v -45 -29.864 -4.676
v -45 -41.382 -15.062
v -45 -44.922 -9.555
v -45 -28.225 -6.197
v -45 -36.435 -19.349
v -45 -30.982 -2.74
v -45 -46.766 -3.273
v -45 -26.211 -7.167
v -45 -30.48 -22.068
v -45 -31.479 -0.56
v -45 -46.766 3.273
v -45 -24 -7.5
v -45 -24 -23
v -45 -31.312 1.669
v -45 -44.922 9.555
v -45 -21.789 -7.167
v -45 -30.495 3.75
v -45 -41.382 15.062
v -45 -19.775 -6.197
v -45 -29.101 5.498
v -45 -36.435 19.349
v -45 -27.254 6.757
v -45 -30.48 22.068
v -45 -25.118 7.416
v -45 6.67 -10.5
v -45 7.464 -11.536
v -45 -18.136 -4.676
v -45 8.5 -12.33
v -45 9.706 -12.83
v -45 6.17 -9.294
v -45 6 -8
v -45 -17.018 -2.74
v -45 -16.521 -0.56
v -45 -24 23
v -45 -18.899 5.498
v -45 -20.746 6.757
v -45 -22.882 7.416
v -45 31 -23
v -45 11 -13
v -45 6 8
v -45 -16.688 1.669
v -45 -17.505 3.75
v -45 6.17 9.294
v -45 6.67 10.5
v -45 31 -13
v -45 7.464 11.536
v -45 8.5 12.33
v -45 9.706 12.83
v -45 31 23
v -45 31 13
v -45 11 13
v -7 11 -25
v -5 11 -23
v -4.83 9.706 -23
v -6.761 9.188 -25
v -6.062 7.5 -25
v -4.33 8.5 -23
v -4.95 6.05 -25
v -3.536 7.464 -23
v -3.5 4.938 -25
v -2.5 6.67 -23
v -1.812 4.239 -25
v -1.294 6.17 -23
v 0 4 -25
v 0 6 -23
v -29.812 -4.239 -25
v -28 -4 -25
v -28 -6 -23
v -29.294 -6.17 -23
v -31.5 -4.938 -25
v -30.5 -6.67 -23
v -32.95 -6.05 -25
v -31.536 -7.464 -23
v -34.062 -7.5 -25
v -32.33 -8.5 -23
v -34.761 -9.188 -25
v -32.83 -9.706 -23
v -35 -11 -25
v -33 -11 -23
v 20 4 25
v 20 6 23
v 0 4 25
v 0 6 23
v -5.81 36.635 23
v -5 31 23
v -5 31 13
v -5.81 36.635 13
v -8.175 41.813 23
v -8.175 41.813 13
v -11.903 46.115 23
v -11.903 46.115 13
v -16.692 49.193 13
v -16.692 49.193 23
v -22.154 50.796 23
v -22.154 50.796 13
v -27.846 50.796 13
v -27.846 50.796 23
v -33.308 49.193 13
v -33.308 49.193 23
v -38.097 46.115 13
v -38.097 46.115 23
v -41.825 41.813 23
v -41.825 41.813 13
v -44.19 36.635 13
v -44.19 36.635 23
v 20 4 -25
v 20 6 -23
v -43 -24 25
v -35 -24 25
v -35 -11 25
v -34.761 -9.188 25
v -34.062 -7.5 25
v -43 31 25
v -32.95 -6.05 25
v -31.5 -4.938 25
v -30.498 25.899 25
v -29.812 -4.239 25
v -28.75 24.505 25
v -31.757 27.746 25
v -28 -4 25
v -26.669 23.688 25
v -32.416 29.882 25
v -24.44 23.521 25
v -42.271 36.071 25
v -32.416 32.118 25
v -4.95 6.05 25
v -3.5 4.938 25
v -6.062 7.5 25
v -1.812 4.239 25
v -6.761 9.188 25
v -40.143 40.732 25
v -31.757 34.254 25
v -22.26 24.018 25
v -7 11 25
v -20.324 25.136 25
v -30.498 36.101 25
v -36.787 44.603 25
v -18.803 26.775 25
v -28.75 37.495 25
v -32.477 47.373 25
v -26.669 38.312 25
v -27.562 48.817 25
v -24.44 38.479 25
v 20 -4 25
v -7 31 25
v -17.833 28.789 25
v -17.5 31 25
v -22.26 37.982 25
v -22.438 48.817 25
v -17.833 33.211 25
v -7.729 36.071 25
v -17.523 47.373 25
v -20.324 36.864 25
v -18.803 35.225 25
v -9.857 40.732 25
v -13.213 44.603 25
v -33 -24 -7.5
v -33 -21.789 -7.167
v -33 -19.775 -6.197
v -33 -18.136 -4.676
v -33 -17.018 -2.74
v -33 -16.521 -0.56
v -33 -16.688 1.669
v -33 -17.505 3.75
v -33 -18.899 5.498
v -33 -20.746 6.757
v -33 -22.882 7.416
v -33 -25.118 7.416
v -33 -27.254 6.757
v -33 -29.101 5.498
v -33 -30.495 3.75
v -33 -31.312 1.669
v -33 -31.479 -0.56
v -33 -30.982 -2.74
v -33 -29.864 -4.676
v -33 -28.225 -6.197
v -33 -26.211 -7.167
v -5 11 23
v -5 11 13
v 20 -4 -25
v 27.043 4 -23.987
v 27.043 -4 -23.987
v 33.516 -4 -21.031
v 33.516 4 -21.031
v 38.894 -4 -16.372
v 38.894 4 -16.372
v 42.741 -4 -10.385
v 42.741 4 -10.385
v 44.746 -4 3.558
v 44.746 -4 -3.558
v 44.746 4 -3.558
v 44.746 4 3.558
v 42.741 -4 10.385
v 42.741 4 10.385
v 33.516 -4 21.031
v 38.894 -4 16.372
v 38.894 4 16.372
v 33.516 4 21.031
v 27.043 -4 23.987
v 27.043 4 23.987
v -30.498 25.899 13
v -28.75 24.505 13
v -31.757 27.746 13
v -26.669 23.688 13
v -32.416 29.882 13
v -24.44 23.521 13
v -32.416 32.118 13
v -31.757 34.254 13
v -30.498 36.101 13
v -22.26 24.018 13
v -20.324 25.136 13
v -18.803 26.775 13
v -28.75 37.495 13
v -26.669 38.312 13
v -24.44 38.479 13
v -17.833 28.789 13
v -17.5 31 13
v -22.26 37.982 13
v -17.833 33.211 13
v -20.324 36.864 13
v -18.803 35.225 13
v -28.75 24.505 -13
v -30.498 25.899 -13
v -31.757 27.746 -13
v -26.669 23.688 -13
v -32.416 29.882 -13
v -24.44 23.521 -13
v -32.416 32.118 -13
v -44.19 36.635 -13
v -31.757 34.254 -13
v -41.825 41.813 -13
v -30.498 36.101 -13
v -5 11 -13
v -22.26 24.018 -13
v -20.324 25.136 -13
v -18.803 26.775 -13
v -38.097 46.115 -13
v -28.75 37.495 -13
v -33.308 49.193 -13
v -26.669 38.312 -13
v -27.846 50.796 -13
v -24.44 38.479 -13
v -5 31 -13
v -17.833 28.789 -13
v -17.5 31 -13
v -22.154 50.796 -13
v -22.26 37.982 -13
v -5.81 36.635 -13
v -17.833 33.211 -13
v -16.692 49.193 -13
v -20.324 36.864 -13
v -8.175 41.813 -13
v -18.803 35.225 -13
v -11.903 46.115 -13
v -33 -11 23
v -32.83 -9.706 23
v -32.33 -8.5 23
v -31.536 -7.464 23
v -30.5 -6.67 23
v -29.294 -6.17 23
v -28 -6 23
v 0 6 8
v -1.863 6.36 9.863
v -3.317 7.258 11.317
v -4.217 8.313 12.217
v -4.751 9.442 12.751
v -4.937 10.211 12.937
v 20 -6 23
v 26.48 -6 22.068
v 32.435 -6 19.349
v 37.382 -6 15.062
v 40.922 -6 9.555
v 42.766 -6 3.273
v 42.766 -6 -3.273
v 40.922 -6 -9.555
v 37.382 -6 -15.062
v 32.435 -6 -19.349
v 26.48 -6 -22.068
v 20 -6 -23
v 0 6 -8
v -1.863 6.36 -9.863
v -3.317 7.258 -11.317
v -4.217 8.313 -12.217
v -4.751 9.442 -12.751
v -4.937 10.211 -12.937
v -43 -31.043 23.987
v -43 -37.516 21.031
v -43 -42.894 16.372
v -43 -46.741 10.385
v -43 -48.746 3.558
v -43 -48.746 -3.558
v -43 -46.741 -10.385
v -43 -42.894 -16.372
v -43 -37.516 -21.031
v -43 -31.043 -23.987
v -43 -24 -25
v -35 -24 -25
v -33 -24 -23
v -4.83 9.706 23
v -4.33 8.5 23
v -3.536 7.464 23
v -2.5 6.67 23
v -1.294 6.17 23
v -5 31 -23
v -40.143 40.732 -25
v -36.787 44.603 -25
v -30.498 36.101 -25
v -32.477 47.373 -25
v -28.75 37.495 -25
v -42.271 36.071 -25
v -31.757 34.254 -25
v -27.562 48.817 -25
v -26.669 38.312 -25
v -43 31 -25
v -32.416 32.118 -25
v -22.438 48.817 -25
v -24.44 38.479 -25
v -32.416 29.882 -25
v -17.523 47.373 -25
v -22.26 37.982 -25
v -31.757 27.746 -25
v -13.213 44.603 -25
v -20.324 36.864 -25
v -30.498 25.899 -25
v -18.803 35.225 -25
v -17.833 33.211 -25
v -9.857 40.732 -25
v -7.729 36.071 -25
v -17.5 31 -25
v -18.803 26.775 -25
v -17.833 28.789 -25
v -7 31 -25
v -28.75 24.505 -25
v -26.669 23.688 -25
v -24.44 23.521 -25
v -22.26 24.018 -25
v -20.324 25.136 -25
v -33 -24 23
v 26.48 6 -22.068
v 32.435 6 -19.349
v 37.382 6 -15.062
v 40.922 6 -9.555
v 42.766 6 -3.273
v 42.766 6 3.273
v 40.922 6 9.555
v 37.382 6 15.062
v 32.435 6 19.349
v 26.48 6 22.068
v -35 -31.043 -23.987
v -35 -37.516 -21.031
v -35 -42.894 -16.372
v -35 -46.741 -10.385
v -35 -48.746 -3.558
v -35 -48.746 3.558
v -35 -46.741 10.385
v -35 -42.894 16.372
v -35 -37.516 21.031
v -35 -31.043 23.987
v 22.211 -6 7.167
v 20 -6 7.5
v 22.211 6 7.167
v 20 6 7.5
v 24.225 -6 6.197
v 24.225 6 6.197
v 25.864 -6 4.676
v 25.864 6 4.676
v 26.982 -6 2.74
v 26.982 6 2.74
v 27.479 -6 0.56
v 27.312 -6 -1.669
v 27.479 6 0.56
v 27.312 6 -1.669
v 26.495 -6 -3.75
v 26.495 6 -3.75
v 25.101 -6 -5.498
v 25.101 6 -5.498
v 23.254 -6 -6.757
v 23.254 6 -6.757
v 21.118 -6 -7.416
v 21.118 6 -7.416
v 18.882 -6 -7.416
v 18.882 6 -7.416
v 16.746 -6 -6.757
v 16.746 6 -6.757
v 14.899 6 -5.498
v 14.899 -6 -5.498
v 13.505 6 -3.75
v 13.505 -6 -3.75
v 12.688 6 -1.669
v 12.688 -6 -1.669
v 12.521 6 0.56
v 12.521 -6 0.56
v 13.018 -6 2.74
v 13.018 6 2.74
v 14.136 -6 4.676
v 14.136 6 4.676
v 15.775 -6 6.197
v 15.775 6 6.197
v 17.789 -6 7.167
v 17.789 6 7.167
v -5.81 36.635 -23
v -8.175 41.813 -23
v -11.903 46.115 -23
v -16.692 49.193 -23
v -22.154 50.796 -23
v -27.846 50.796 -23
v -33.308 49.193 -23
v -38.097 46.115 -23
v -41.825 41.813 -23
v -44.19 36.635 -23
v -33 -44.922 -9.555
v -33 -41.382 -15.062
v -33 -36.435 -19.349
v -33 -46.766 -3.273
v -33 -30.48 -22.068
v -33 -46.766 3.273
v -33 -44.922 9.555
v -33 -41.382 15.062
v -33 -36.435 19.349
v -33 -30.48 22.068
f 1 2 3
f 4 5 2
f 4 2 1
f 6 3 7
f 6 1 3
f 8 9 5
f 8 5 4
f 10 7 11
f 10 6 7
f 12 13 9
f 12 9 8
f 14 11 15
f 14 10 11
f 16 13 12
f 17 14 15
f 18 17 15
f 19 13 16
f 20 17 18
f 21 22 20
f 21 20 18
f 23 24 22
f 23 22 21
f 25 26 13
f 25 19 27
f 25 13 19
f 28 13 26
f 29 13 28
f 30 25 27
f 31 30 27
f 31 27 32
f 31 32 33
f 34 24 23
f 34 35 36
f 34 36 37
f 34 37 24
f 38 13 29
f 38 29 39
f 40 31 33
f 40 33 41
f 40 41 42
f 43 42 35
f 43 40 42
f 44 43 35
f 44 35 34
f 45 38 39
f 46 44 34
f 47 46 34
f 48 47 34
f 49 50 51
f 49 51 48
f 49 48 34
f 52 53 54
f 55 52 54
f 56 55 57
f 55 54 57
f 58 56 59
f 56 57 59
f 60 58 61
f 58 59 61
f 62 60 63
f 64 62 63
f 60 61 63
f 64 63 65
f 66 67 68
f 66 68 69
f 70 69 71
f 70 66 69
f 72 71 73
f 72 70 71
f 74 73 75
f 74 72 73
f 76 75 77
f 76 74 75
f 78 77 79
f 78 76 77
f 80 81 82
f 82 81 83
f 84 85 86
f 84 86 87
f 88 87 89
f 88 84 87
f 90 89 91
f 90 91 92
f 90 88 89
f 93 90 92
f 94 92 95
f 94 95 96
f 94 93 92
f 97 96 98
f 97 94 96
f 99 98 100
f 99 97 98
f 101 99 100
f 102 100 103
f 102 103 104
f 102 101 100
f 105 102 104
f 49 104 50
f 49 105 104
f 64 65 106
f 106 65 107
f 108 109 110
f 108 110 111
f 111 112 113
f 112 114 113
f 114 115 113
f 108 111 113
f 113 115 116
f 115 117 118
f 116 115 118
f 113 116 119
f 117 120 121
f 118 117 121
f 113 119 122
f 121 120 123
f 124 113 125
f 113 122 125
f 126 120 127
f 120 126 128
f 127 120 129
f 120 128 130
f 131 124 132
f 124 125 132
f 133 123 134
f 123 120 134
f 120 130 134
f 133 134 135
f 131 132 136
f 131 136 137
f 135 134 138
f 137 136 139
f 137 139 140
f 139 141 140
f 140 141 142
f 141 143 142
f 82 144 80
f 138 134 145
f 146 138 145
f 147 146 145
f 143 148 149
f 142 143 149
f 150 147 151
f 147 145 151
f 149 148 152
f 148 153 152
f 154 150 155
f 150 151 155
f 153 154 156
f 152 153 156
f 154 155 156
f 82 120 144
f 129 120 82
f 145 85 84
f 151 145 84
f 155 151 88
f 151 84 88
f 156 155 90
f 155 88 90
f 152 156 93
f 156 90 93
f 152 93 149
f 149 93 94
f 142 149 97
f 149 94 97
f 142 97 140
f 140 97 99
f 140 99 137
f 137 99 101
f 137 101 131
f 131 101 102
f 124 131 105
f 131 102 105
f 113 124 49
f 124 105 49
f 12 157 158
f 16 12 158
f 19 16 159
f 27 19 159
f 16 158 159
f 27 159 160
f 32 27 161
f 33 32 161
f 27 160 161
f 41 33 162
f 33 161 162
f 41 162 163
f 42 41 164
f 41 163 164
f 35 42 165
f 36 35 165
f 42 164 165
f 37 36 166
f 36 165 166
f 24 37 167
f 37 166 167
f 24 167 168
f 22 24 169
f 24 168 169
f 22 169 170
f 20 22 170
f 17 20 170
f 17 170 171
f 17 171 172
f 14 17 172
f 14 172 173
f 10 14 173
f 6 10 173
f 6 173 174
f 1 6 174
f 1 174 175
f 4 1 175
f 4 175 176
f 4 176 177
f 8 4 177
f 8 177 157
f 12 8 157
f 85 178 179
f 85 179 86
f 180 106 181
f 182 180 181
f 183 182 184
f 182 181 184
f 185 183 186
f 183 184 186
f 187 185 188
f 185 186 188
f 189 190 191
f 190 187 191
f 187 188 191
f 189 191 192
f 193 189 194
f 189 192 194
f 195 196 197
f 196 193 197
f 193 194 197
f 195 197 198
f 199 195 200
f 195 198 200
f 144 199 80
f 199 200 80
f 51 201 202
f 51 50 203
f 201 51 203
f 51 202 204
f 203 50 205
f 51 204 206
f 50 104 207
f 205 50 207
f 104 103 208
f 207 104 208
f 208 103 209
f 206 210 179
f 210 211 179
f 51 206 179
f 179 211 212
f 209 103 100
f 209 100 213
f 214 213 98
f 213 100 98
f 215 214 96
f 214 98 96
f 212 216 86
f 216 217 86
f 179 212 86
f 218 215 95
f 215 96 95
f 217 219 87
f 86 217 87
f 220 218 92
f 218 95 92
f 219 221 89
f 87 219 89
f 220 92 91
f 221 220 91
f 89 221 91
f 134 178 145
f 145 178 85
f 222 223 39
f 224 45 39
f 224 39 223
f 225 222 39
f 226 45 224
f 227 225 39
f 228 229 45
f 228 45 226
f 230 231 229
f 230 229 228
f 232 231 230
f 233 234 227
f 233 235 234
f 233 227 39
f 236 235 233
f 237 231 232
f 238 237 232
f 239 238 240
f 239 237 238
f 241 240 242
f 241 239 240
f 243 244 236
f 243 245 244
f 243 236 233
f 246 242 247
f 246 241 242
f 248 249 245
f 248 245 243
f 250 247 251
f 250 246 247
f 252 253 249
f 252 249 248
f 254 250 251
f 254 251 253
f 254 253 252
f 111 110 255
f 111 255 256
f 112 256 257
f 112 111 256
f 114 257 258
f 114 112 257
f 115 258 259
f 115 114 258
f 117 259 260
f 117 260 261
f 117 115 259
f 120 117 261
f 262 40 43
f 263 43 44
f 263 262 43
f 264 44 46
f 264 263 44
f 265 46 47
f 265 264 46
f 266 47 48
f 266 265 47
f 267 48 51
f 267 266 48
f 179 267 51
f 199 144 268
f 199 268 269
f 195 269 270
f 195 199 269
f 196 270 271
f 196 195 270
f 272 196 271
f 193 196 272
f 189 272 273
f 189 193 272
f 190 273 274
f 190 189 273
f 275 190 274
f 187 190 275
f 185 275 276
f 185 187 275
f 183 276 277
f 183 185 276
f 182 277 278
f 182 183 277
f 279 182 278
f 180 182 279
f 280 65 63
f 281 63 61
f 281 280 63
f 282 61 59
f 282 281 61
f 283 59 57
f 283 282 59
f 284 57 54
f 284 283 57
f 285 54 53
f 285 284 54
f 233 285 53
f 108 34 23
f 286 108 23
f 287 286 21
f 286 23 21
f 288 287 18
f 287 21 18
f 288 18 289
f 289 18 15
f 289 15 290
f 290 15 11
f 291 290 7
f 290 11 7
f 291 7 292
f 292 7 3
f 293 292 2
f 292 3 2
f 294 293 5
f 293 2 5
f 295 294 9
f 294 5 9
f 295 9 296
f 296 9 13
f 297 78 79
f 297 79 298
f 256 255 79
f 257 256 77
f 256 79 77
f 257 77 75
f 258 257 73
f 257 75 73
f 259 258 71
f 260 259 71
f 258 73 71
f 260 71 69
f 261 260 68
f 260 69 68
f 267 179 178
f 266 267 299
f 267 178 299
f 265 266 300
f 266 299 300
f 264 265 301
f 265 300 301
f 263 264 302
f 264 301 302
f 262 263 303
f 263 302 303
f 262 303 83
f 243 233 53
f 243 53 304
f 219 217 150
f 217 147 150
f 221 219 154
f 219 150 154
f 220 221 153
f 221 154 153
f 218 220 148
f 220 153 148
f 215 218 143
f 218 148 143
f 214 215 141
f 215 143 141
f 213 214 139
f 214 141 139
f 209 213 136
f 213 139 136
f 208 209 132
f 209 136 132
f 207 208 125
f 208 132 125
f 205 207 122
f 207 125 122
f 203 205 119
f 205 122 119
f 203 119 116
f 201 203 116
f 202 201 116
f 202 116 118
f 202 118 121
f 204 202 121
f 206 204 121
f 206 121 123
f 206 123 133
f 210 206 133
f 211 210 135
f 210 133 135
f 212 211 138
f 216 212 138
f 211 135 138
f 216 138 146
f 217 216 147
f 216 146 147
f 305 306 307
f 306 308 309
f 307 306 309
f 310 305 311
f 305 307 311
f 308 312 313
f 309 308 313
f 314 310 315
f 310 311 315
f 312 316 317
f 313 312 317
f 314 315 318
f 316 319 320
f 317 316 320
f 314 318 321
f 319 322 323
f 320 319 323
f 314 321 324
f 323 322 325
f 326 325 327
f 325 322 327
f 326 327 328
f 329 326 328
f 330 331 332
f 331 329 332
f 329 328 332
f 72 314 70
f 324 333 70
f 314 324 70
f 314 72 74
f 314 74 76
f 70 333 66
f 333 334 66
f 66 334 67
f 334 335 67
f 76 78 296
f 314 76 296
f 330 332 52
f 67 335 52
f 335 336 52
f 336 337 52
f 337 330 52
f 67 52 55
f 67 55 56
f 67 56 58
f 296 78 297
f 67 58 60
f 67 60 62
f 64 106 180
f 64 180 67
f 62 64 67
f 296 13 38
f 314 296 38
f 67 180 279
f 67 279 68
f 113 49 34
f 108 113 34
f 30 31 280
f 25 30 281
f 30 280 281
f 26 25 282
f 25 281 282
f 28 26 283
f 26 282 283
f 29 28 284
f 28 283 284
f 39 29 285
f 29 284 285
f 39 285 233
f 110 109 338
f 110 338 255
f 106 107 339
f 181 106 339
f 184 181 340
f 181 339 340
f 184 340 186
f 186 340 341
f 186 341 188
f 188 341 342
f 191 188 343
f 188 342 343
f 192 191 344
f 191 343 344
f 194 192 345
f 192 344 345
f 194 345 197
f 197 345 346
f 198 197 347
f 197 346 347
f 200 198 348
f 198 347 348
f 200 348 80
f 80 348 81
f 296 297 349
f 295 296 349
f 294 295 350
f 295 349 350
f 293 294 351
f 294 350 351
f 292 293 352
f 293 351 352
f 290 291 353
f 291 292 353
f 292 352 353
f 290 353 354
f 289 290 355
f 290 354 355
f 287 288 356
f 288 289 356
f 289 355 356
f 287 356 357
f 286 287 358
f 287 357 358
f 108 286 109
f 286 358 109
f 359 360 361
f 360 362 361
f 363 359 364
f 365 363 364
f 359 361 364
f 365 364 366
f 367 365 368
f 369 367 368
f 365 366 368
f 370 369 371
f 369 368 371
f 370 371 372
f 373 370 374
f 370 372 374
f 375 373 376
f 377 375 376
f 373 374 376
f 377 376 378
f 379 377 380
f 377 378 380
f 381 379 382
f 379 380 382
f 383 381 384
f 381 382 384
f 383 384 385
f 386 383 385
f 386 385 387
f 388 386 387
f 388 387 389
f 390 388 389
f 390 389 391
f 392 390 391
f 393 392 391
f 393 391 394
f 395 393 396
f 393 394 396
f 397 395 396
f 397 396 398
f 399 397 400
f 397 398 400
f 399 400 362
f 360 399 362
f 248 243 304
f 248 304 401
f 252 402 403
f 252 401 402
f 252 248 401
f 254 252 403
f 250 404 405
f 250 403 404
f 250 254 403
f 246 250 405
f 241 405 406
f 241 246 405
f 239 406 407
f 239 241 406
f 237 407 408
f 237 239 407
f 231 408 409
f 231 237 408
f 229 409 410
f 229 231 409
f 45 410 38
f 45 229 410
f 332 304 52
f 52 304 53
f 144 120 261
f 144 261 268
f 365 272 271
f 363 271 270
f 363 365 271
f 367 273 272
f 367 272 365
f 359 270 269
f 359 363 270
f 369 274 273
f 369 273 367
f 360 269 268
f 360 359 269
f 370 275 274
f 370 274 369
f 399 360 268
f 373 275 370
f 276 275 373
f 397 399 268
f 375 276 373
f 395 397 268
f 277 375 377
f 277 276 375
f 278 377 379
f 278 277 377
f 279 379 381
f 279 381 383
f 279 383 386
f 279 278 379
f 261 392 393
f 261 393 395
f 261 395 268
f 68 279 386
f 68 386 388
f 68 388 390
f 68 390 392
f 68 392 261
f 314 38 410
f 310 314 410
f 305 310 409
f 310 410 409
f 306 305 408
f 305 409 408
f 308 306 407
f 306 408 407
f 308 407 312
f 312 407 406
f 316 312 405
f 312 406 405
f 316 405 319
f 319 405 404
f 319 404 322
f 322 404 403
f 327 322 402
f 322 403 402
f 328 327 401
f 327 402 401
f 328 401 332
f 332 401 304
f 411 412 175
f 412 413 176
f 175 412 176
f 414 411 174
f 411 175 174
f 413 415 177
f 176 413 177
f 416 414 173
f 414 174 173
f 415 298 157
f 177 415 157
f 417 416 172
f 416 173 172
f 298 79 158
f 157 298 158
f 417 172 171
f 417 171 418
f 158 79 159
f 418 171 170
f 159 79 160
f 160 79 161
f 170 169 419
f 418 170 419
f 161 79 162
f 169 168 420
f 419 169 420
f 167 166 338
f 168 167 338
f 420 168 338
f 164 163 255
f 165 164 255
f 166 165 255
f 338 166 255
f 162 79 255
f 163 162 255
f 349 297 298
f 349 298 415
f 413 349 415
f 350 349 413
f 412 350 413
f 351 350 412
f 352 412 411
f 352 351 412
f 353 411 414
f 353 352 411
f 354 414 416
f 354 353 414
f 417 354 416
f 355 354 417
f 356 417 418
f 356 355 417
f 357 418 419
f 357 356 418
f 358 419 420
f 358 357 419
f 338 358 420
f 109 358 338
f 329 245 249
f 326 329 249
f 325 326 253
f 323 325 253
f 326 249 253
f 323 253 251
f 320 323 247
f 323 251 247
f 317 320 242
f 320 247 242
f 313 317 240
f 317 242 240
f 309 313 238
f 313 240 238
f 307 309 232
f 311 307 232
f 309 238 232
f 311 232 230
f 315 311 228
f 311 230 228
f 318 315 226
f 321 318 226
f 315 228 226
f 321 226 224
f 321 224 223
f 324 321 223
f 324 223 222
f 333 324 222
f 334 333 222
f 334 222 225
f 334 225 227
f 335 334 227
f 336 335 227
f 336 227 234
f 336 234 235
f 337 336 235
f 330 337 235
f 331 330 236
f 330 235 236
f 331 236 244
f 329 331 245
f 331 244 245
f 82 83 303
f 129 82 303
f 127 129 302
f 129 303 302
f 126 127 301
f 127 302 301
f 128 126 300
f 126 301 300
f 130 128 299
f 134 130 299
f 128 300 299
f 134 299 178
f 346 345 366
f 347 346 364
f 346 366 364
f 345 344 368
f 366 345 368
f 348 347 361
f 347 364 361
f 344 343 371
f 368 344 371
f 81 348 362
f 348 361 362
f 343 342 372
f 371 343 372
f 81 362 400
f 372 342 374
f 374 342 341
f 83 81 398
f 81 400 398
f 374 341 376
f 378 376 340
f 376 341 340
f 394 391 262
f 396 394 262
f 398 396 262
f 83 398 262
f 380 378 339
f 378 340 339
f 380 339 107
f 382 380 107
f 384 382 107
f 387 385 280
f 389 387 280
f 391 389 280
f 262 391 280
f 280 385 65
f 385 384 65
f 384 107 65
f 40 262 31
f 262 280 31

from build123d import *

# Parameters (mm, degrees)
BOSS_EXTRUDE1_DEPTH = 6
BOSS_EXTRUDE2_START = 19
BOSS_EXTRUDE2_DEPTH = 6
BOSS_EXTRUDE3_START = -19
BOSS_EXTRUDE3_DEPTH = 6
BOSS_EXTRUDE4_START = -39
BOSS_EXTRUDE4_DEPTH = 6
SKETCH7_R           = 7.5
CUT_EXTRUDE1_DEPTH  = 25
SKETCH4_R           = 7.5
CUT_EXTRUDE2_DEPTH  = 73.463784058
SKETCH6_R           = 7.5
CUT_EXTRUDE3_DEPTH  = 10
FILLET1_R           = 5
CHAMFER1_SIZE       = 2


with BuildPart() as part:
    # Sketch1 → Boss-Extrude1 (new, symmetric)
    with BuildSketch(Plane(origin=(0, 0, 0), x_dir=(1, 0, 0), z_dir=(0, 1, 0))):
        with BuildLine():
            Line((-45, 25), (20, 25))
            ThreePointArc((20, 25), (45, 0), (20, -25))
            Line((20, -25), (-45, -25))
            Line((-45, -25), (-45, 25))
        make_face()
    extrude(amount=BOSS_EXTRUDE1_DEPTH, both=True)

    # Sketch2 → Boss-Extrude2 (add, symmetric)
    with BuildSketch(Plane.XY.offset(BOSS_EXTRUDE2_START)):
        with BuildLine():
            Line((-45, 6), (-5, 6))
            Line((-5, 6), (-5, 31))
            ThreePointArc((-5, 31), (-25, 51), (-45, 31))
            Line((-45, 31), (-45, 6))
        make_face()
    extrude(amount=BOSS_EXTRUDE2_DEPTH, both=True)

    # Sketch2<2> → Boss-Extrude3 (add, symmetric)
    with BuildSketch(Plane.XY.offset(BOSS_EXTRUDE3_START)):
        with BuildLine():
            Line((-45, 6), (-5, 6))
            Line((-5, 6), (-5, 31))
            ThreePointArc((-5, 31), (-25, 51), (-45, 31))
            Line((-45, 31), (-45, 6))
        make_face()
    extrude(amount=BOSS_EXTRUDE3_DEPTH, both=True)

    # Sketch3 → Boss-Extrude4 (add, symmetric)
    with BuildSketch(Plane(origin=(0, 0, 0), x_dir=(0, 0, -1), z_dir=(1, 0, 0)).offset(BOSS_EXTRUDE4_START)):
        with BuildLine():
            Line((-25, -6), (25, -6))
            Line((25, -6), (25, -24))
            ThreePointArc((25, -24), (0, -49), (-25, -24))
            Line((-25, -24), (-25, -6))
        make_face()
    extrude(amount=BOSS_EXTRUDE4_DEPTH, both=True)

    # Sketch7 → Cut-Extrude1 (cut, symmetric)
    with BuildSketch(Plane.XY):
        with Locations((-25, 31)):
            Circle(SKETCH7_R)
    extrude(amount=CUT_EXTRUDE1_DEPTH, both=True, mode=Mode.SUBTRACT)

    # Sketch4 → Cut-Extrude2 (cut, through all)
    with BuildSketch(Plane(origin=(0, 0, 0), x_dir=(0, 0, -1), z_dir=(1, 0, 0))):
        with Locations((0, -24)):
            Circle(SKETCH4_R)
    extrude(amount=-CUT_EXTRUDE2_DEPTH, mode=Mode.SUBTRACT)

    # Sketch6 → Cut-Extrude3 (cut, symmetric)
    with BuildSketch(Plane(origin=(0, 0, 0), x_dir=(1, 0, 0), z_dir=(0, 1, 0))):
        with Locations((20, 0)):
            Circle(SKETCH6_R)
    extrude(amount=CUT_EXTRUDE3_DEPTH, both=True, mode=Mode.SUBTRACT)

    # Fillet1
    fillet1_edges = [part.edges().sort_by_distance(p)[0] for p in [
        (-33, -6, 0),
        (-25, 6, -13),
        (-5, 6, -19),
        (-25, 6, 13),
        (-5, 6, 19),
    ]]
    fillet(fillet1_edges, radius=FILLET1_R)

    # Chamfer1
    chamfer1_edges = [part.edges().sort_by_distance(p)[0] for p in [
        (45, -6, 0),
        (-4, -6, 25),
        (-4, -6, -25),
        (-31.535533906, -7.464466094, -25),
        (-31.535533906, -7.464466094, 25),
        (-33, -17.5, -25),
        (-33, -17.5, 25),
        (-33, -49, 0),
        (-45, -49, 0),
        (-45, 3.5, 25),
        (-45, 3.5, -25),
        (-25, 51, -25),
        (-5, 21, -25),
        (-3.535533906, 7.464466094, -25),
        (10, 6, -25),
        (45, 6, 0),
        (10, 6, 25),
        (-3.535533906, 7.464466094, 25),
        (-5, 21, 25),
        (-25, 51, 25),
    ]]
    chamfer(chamfer1_edges, length=CHAMFER1_SIZE)


solid = part.part
